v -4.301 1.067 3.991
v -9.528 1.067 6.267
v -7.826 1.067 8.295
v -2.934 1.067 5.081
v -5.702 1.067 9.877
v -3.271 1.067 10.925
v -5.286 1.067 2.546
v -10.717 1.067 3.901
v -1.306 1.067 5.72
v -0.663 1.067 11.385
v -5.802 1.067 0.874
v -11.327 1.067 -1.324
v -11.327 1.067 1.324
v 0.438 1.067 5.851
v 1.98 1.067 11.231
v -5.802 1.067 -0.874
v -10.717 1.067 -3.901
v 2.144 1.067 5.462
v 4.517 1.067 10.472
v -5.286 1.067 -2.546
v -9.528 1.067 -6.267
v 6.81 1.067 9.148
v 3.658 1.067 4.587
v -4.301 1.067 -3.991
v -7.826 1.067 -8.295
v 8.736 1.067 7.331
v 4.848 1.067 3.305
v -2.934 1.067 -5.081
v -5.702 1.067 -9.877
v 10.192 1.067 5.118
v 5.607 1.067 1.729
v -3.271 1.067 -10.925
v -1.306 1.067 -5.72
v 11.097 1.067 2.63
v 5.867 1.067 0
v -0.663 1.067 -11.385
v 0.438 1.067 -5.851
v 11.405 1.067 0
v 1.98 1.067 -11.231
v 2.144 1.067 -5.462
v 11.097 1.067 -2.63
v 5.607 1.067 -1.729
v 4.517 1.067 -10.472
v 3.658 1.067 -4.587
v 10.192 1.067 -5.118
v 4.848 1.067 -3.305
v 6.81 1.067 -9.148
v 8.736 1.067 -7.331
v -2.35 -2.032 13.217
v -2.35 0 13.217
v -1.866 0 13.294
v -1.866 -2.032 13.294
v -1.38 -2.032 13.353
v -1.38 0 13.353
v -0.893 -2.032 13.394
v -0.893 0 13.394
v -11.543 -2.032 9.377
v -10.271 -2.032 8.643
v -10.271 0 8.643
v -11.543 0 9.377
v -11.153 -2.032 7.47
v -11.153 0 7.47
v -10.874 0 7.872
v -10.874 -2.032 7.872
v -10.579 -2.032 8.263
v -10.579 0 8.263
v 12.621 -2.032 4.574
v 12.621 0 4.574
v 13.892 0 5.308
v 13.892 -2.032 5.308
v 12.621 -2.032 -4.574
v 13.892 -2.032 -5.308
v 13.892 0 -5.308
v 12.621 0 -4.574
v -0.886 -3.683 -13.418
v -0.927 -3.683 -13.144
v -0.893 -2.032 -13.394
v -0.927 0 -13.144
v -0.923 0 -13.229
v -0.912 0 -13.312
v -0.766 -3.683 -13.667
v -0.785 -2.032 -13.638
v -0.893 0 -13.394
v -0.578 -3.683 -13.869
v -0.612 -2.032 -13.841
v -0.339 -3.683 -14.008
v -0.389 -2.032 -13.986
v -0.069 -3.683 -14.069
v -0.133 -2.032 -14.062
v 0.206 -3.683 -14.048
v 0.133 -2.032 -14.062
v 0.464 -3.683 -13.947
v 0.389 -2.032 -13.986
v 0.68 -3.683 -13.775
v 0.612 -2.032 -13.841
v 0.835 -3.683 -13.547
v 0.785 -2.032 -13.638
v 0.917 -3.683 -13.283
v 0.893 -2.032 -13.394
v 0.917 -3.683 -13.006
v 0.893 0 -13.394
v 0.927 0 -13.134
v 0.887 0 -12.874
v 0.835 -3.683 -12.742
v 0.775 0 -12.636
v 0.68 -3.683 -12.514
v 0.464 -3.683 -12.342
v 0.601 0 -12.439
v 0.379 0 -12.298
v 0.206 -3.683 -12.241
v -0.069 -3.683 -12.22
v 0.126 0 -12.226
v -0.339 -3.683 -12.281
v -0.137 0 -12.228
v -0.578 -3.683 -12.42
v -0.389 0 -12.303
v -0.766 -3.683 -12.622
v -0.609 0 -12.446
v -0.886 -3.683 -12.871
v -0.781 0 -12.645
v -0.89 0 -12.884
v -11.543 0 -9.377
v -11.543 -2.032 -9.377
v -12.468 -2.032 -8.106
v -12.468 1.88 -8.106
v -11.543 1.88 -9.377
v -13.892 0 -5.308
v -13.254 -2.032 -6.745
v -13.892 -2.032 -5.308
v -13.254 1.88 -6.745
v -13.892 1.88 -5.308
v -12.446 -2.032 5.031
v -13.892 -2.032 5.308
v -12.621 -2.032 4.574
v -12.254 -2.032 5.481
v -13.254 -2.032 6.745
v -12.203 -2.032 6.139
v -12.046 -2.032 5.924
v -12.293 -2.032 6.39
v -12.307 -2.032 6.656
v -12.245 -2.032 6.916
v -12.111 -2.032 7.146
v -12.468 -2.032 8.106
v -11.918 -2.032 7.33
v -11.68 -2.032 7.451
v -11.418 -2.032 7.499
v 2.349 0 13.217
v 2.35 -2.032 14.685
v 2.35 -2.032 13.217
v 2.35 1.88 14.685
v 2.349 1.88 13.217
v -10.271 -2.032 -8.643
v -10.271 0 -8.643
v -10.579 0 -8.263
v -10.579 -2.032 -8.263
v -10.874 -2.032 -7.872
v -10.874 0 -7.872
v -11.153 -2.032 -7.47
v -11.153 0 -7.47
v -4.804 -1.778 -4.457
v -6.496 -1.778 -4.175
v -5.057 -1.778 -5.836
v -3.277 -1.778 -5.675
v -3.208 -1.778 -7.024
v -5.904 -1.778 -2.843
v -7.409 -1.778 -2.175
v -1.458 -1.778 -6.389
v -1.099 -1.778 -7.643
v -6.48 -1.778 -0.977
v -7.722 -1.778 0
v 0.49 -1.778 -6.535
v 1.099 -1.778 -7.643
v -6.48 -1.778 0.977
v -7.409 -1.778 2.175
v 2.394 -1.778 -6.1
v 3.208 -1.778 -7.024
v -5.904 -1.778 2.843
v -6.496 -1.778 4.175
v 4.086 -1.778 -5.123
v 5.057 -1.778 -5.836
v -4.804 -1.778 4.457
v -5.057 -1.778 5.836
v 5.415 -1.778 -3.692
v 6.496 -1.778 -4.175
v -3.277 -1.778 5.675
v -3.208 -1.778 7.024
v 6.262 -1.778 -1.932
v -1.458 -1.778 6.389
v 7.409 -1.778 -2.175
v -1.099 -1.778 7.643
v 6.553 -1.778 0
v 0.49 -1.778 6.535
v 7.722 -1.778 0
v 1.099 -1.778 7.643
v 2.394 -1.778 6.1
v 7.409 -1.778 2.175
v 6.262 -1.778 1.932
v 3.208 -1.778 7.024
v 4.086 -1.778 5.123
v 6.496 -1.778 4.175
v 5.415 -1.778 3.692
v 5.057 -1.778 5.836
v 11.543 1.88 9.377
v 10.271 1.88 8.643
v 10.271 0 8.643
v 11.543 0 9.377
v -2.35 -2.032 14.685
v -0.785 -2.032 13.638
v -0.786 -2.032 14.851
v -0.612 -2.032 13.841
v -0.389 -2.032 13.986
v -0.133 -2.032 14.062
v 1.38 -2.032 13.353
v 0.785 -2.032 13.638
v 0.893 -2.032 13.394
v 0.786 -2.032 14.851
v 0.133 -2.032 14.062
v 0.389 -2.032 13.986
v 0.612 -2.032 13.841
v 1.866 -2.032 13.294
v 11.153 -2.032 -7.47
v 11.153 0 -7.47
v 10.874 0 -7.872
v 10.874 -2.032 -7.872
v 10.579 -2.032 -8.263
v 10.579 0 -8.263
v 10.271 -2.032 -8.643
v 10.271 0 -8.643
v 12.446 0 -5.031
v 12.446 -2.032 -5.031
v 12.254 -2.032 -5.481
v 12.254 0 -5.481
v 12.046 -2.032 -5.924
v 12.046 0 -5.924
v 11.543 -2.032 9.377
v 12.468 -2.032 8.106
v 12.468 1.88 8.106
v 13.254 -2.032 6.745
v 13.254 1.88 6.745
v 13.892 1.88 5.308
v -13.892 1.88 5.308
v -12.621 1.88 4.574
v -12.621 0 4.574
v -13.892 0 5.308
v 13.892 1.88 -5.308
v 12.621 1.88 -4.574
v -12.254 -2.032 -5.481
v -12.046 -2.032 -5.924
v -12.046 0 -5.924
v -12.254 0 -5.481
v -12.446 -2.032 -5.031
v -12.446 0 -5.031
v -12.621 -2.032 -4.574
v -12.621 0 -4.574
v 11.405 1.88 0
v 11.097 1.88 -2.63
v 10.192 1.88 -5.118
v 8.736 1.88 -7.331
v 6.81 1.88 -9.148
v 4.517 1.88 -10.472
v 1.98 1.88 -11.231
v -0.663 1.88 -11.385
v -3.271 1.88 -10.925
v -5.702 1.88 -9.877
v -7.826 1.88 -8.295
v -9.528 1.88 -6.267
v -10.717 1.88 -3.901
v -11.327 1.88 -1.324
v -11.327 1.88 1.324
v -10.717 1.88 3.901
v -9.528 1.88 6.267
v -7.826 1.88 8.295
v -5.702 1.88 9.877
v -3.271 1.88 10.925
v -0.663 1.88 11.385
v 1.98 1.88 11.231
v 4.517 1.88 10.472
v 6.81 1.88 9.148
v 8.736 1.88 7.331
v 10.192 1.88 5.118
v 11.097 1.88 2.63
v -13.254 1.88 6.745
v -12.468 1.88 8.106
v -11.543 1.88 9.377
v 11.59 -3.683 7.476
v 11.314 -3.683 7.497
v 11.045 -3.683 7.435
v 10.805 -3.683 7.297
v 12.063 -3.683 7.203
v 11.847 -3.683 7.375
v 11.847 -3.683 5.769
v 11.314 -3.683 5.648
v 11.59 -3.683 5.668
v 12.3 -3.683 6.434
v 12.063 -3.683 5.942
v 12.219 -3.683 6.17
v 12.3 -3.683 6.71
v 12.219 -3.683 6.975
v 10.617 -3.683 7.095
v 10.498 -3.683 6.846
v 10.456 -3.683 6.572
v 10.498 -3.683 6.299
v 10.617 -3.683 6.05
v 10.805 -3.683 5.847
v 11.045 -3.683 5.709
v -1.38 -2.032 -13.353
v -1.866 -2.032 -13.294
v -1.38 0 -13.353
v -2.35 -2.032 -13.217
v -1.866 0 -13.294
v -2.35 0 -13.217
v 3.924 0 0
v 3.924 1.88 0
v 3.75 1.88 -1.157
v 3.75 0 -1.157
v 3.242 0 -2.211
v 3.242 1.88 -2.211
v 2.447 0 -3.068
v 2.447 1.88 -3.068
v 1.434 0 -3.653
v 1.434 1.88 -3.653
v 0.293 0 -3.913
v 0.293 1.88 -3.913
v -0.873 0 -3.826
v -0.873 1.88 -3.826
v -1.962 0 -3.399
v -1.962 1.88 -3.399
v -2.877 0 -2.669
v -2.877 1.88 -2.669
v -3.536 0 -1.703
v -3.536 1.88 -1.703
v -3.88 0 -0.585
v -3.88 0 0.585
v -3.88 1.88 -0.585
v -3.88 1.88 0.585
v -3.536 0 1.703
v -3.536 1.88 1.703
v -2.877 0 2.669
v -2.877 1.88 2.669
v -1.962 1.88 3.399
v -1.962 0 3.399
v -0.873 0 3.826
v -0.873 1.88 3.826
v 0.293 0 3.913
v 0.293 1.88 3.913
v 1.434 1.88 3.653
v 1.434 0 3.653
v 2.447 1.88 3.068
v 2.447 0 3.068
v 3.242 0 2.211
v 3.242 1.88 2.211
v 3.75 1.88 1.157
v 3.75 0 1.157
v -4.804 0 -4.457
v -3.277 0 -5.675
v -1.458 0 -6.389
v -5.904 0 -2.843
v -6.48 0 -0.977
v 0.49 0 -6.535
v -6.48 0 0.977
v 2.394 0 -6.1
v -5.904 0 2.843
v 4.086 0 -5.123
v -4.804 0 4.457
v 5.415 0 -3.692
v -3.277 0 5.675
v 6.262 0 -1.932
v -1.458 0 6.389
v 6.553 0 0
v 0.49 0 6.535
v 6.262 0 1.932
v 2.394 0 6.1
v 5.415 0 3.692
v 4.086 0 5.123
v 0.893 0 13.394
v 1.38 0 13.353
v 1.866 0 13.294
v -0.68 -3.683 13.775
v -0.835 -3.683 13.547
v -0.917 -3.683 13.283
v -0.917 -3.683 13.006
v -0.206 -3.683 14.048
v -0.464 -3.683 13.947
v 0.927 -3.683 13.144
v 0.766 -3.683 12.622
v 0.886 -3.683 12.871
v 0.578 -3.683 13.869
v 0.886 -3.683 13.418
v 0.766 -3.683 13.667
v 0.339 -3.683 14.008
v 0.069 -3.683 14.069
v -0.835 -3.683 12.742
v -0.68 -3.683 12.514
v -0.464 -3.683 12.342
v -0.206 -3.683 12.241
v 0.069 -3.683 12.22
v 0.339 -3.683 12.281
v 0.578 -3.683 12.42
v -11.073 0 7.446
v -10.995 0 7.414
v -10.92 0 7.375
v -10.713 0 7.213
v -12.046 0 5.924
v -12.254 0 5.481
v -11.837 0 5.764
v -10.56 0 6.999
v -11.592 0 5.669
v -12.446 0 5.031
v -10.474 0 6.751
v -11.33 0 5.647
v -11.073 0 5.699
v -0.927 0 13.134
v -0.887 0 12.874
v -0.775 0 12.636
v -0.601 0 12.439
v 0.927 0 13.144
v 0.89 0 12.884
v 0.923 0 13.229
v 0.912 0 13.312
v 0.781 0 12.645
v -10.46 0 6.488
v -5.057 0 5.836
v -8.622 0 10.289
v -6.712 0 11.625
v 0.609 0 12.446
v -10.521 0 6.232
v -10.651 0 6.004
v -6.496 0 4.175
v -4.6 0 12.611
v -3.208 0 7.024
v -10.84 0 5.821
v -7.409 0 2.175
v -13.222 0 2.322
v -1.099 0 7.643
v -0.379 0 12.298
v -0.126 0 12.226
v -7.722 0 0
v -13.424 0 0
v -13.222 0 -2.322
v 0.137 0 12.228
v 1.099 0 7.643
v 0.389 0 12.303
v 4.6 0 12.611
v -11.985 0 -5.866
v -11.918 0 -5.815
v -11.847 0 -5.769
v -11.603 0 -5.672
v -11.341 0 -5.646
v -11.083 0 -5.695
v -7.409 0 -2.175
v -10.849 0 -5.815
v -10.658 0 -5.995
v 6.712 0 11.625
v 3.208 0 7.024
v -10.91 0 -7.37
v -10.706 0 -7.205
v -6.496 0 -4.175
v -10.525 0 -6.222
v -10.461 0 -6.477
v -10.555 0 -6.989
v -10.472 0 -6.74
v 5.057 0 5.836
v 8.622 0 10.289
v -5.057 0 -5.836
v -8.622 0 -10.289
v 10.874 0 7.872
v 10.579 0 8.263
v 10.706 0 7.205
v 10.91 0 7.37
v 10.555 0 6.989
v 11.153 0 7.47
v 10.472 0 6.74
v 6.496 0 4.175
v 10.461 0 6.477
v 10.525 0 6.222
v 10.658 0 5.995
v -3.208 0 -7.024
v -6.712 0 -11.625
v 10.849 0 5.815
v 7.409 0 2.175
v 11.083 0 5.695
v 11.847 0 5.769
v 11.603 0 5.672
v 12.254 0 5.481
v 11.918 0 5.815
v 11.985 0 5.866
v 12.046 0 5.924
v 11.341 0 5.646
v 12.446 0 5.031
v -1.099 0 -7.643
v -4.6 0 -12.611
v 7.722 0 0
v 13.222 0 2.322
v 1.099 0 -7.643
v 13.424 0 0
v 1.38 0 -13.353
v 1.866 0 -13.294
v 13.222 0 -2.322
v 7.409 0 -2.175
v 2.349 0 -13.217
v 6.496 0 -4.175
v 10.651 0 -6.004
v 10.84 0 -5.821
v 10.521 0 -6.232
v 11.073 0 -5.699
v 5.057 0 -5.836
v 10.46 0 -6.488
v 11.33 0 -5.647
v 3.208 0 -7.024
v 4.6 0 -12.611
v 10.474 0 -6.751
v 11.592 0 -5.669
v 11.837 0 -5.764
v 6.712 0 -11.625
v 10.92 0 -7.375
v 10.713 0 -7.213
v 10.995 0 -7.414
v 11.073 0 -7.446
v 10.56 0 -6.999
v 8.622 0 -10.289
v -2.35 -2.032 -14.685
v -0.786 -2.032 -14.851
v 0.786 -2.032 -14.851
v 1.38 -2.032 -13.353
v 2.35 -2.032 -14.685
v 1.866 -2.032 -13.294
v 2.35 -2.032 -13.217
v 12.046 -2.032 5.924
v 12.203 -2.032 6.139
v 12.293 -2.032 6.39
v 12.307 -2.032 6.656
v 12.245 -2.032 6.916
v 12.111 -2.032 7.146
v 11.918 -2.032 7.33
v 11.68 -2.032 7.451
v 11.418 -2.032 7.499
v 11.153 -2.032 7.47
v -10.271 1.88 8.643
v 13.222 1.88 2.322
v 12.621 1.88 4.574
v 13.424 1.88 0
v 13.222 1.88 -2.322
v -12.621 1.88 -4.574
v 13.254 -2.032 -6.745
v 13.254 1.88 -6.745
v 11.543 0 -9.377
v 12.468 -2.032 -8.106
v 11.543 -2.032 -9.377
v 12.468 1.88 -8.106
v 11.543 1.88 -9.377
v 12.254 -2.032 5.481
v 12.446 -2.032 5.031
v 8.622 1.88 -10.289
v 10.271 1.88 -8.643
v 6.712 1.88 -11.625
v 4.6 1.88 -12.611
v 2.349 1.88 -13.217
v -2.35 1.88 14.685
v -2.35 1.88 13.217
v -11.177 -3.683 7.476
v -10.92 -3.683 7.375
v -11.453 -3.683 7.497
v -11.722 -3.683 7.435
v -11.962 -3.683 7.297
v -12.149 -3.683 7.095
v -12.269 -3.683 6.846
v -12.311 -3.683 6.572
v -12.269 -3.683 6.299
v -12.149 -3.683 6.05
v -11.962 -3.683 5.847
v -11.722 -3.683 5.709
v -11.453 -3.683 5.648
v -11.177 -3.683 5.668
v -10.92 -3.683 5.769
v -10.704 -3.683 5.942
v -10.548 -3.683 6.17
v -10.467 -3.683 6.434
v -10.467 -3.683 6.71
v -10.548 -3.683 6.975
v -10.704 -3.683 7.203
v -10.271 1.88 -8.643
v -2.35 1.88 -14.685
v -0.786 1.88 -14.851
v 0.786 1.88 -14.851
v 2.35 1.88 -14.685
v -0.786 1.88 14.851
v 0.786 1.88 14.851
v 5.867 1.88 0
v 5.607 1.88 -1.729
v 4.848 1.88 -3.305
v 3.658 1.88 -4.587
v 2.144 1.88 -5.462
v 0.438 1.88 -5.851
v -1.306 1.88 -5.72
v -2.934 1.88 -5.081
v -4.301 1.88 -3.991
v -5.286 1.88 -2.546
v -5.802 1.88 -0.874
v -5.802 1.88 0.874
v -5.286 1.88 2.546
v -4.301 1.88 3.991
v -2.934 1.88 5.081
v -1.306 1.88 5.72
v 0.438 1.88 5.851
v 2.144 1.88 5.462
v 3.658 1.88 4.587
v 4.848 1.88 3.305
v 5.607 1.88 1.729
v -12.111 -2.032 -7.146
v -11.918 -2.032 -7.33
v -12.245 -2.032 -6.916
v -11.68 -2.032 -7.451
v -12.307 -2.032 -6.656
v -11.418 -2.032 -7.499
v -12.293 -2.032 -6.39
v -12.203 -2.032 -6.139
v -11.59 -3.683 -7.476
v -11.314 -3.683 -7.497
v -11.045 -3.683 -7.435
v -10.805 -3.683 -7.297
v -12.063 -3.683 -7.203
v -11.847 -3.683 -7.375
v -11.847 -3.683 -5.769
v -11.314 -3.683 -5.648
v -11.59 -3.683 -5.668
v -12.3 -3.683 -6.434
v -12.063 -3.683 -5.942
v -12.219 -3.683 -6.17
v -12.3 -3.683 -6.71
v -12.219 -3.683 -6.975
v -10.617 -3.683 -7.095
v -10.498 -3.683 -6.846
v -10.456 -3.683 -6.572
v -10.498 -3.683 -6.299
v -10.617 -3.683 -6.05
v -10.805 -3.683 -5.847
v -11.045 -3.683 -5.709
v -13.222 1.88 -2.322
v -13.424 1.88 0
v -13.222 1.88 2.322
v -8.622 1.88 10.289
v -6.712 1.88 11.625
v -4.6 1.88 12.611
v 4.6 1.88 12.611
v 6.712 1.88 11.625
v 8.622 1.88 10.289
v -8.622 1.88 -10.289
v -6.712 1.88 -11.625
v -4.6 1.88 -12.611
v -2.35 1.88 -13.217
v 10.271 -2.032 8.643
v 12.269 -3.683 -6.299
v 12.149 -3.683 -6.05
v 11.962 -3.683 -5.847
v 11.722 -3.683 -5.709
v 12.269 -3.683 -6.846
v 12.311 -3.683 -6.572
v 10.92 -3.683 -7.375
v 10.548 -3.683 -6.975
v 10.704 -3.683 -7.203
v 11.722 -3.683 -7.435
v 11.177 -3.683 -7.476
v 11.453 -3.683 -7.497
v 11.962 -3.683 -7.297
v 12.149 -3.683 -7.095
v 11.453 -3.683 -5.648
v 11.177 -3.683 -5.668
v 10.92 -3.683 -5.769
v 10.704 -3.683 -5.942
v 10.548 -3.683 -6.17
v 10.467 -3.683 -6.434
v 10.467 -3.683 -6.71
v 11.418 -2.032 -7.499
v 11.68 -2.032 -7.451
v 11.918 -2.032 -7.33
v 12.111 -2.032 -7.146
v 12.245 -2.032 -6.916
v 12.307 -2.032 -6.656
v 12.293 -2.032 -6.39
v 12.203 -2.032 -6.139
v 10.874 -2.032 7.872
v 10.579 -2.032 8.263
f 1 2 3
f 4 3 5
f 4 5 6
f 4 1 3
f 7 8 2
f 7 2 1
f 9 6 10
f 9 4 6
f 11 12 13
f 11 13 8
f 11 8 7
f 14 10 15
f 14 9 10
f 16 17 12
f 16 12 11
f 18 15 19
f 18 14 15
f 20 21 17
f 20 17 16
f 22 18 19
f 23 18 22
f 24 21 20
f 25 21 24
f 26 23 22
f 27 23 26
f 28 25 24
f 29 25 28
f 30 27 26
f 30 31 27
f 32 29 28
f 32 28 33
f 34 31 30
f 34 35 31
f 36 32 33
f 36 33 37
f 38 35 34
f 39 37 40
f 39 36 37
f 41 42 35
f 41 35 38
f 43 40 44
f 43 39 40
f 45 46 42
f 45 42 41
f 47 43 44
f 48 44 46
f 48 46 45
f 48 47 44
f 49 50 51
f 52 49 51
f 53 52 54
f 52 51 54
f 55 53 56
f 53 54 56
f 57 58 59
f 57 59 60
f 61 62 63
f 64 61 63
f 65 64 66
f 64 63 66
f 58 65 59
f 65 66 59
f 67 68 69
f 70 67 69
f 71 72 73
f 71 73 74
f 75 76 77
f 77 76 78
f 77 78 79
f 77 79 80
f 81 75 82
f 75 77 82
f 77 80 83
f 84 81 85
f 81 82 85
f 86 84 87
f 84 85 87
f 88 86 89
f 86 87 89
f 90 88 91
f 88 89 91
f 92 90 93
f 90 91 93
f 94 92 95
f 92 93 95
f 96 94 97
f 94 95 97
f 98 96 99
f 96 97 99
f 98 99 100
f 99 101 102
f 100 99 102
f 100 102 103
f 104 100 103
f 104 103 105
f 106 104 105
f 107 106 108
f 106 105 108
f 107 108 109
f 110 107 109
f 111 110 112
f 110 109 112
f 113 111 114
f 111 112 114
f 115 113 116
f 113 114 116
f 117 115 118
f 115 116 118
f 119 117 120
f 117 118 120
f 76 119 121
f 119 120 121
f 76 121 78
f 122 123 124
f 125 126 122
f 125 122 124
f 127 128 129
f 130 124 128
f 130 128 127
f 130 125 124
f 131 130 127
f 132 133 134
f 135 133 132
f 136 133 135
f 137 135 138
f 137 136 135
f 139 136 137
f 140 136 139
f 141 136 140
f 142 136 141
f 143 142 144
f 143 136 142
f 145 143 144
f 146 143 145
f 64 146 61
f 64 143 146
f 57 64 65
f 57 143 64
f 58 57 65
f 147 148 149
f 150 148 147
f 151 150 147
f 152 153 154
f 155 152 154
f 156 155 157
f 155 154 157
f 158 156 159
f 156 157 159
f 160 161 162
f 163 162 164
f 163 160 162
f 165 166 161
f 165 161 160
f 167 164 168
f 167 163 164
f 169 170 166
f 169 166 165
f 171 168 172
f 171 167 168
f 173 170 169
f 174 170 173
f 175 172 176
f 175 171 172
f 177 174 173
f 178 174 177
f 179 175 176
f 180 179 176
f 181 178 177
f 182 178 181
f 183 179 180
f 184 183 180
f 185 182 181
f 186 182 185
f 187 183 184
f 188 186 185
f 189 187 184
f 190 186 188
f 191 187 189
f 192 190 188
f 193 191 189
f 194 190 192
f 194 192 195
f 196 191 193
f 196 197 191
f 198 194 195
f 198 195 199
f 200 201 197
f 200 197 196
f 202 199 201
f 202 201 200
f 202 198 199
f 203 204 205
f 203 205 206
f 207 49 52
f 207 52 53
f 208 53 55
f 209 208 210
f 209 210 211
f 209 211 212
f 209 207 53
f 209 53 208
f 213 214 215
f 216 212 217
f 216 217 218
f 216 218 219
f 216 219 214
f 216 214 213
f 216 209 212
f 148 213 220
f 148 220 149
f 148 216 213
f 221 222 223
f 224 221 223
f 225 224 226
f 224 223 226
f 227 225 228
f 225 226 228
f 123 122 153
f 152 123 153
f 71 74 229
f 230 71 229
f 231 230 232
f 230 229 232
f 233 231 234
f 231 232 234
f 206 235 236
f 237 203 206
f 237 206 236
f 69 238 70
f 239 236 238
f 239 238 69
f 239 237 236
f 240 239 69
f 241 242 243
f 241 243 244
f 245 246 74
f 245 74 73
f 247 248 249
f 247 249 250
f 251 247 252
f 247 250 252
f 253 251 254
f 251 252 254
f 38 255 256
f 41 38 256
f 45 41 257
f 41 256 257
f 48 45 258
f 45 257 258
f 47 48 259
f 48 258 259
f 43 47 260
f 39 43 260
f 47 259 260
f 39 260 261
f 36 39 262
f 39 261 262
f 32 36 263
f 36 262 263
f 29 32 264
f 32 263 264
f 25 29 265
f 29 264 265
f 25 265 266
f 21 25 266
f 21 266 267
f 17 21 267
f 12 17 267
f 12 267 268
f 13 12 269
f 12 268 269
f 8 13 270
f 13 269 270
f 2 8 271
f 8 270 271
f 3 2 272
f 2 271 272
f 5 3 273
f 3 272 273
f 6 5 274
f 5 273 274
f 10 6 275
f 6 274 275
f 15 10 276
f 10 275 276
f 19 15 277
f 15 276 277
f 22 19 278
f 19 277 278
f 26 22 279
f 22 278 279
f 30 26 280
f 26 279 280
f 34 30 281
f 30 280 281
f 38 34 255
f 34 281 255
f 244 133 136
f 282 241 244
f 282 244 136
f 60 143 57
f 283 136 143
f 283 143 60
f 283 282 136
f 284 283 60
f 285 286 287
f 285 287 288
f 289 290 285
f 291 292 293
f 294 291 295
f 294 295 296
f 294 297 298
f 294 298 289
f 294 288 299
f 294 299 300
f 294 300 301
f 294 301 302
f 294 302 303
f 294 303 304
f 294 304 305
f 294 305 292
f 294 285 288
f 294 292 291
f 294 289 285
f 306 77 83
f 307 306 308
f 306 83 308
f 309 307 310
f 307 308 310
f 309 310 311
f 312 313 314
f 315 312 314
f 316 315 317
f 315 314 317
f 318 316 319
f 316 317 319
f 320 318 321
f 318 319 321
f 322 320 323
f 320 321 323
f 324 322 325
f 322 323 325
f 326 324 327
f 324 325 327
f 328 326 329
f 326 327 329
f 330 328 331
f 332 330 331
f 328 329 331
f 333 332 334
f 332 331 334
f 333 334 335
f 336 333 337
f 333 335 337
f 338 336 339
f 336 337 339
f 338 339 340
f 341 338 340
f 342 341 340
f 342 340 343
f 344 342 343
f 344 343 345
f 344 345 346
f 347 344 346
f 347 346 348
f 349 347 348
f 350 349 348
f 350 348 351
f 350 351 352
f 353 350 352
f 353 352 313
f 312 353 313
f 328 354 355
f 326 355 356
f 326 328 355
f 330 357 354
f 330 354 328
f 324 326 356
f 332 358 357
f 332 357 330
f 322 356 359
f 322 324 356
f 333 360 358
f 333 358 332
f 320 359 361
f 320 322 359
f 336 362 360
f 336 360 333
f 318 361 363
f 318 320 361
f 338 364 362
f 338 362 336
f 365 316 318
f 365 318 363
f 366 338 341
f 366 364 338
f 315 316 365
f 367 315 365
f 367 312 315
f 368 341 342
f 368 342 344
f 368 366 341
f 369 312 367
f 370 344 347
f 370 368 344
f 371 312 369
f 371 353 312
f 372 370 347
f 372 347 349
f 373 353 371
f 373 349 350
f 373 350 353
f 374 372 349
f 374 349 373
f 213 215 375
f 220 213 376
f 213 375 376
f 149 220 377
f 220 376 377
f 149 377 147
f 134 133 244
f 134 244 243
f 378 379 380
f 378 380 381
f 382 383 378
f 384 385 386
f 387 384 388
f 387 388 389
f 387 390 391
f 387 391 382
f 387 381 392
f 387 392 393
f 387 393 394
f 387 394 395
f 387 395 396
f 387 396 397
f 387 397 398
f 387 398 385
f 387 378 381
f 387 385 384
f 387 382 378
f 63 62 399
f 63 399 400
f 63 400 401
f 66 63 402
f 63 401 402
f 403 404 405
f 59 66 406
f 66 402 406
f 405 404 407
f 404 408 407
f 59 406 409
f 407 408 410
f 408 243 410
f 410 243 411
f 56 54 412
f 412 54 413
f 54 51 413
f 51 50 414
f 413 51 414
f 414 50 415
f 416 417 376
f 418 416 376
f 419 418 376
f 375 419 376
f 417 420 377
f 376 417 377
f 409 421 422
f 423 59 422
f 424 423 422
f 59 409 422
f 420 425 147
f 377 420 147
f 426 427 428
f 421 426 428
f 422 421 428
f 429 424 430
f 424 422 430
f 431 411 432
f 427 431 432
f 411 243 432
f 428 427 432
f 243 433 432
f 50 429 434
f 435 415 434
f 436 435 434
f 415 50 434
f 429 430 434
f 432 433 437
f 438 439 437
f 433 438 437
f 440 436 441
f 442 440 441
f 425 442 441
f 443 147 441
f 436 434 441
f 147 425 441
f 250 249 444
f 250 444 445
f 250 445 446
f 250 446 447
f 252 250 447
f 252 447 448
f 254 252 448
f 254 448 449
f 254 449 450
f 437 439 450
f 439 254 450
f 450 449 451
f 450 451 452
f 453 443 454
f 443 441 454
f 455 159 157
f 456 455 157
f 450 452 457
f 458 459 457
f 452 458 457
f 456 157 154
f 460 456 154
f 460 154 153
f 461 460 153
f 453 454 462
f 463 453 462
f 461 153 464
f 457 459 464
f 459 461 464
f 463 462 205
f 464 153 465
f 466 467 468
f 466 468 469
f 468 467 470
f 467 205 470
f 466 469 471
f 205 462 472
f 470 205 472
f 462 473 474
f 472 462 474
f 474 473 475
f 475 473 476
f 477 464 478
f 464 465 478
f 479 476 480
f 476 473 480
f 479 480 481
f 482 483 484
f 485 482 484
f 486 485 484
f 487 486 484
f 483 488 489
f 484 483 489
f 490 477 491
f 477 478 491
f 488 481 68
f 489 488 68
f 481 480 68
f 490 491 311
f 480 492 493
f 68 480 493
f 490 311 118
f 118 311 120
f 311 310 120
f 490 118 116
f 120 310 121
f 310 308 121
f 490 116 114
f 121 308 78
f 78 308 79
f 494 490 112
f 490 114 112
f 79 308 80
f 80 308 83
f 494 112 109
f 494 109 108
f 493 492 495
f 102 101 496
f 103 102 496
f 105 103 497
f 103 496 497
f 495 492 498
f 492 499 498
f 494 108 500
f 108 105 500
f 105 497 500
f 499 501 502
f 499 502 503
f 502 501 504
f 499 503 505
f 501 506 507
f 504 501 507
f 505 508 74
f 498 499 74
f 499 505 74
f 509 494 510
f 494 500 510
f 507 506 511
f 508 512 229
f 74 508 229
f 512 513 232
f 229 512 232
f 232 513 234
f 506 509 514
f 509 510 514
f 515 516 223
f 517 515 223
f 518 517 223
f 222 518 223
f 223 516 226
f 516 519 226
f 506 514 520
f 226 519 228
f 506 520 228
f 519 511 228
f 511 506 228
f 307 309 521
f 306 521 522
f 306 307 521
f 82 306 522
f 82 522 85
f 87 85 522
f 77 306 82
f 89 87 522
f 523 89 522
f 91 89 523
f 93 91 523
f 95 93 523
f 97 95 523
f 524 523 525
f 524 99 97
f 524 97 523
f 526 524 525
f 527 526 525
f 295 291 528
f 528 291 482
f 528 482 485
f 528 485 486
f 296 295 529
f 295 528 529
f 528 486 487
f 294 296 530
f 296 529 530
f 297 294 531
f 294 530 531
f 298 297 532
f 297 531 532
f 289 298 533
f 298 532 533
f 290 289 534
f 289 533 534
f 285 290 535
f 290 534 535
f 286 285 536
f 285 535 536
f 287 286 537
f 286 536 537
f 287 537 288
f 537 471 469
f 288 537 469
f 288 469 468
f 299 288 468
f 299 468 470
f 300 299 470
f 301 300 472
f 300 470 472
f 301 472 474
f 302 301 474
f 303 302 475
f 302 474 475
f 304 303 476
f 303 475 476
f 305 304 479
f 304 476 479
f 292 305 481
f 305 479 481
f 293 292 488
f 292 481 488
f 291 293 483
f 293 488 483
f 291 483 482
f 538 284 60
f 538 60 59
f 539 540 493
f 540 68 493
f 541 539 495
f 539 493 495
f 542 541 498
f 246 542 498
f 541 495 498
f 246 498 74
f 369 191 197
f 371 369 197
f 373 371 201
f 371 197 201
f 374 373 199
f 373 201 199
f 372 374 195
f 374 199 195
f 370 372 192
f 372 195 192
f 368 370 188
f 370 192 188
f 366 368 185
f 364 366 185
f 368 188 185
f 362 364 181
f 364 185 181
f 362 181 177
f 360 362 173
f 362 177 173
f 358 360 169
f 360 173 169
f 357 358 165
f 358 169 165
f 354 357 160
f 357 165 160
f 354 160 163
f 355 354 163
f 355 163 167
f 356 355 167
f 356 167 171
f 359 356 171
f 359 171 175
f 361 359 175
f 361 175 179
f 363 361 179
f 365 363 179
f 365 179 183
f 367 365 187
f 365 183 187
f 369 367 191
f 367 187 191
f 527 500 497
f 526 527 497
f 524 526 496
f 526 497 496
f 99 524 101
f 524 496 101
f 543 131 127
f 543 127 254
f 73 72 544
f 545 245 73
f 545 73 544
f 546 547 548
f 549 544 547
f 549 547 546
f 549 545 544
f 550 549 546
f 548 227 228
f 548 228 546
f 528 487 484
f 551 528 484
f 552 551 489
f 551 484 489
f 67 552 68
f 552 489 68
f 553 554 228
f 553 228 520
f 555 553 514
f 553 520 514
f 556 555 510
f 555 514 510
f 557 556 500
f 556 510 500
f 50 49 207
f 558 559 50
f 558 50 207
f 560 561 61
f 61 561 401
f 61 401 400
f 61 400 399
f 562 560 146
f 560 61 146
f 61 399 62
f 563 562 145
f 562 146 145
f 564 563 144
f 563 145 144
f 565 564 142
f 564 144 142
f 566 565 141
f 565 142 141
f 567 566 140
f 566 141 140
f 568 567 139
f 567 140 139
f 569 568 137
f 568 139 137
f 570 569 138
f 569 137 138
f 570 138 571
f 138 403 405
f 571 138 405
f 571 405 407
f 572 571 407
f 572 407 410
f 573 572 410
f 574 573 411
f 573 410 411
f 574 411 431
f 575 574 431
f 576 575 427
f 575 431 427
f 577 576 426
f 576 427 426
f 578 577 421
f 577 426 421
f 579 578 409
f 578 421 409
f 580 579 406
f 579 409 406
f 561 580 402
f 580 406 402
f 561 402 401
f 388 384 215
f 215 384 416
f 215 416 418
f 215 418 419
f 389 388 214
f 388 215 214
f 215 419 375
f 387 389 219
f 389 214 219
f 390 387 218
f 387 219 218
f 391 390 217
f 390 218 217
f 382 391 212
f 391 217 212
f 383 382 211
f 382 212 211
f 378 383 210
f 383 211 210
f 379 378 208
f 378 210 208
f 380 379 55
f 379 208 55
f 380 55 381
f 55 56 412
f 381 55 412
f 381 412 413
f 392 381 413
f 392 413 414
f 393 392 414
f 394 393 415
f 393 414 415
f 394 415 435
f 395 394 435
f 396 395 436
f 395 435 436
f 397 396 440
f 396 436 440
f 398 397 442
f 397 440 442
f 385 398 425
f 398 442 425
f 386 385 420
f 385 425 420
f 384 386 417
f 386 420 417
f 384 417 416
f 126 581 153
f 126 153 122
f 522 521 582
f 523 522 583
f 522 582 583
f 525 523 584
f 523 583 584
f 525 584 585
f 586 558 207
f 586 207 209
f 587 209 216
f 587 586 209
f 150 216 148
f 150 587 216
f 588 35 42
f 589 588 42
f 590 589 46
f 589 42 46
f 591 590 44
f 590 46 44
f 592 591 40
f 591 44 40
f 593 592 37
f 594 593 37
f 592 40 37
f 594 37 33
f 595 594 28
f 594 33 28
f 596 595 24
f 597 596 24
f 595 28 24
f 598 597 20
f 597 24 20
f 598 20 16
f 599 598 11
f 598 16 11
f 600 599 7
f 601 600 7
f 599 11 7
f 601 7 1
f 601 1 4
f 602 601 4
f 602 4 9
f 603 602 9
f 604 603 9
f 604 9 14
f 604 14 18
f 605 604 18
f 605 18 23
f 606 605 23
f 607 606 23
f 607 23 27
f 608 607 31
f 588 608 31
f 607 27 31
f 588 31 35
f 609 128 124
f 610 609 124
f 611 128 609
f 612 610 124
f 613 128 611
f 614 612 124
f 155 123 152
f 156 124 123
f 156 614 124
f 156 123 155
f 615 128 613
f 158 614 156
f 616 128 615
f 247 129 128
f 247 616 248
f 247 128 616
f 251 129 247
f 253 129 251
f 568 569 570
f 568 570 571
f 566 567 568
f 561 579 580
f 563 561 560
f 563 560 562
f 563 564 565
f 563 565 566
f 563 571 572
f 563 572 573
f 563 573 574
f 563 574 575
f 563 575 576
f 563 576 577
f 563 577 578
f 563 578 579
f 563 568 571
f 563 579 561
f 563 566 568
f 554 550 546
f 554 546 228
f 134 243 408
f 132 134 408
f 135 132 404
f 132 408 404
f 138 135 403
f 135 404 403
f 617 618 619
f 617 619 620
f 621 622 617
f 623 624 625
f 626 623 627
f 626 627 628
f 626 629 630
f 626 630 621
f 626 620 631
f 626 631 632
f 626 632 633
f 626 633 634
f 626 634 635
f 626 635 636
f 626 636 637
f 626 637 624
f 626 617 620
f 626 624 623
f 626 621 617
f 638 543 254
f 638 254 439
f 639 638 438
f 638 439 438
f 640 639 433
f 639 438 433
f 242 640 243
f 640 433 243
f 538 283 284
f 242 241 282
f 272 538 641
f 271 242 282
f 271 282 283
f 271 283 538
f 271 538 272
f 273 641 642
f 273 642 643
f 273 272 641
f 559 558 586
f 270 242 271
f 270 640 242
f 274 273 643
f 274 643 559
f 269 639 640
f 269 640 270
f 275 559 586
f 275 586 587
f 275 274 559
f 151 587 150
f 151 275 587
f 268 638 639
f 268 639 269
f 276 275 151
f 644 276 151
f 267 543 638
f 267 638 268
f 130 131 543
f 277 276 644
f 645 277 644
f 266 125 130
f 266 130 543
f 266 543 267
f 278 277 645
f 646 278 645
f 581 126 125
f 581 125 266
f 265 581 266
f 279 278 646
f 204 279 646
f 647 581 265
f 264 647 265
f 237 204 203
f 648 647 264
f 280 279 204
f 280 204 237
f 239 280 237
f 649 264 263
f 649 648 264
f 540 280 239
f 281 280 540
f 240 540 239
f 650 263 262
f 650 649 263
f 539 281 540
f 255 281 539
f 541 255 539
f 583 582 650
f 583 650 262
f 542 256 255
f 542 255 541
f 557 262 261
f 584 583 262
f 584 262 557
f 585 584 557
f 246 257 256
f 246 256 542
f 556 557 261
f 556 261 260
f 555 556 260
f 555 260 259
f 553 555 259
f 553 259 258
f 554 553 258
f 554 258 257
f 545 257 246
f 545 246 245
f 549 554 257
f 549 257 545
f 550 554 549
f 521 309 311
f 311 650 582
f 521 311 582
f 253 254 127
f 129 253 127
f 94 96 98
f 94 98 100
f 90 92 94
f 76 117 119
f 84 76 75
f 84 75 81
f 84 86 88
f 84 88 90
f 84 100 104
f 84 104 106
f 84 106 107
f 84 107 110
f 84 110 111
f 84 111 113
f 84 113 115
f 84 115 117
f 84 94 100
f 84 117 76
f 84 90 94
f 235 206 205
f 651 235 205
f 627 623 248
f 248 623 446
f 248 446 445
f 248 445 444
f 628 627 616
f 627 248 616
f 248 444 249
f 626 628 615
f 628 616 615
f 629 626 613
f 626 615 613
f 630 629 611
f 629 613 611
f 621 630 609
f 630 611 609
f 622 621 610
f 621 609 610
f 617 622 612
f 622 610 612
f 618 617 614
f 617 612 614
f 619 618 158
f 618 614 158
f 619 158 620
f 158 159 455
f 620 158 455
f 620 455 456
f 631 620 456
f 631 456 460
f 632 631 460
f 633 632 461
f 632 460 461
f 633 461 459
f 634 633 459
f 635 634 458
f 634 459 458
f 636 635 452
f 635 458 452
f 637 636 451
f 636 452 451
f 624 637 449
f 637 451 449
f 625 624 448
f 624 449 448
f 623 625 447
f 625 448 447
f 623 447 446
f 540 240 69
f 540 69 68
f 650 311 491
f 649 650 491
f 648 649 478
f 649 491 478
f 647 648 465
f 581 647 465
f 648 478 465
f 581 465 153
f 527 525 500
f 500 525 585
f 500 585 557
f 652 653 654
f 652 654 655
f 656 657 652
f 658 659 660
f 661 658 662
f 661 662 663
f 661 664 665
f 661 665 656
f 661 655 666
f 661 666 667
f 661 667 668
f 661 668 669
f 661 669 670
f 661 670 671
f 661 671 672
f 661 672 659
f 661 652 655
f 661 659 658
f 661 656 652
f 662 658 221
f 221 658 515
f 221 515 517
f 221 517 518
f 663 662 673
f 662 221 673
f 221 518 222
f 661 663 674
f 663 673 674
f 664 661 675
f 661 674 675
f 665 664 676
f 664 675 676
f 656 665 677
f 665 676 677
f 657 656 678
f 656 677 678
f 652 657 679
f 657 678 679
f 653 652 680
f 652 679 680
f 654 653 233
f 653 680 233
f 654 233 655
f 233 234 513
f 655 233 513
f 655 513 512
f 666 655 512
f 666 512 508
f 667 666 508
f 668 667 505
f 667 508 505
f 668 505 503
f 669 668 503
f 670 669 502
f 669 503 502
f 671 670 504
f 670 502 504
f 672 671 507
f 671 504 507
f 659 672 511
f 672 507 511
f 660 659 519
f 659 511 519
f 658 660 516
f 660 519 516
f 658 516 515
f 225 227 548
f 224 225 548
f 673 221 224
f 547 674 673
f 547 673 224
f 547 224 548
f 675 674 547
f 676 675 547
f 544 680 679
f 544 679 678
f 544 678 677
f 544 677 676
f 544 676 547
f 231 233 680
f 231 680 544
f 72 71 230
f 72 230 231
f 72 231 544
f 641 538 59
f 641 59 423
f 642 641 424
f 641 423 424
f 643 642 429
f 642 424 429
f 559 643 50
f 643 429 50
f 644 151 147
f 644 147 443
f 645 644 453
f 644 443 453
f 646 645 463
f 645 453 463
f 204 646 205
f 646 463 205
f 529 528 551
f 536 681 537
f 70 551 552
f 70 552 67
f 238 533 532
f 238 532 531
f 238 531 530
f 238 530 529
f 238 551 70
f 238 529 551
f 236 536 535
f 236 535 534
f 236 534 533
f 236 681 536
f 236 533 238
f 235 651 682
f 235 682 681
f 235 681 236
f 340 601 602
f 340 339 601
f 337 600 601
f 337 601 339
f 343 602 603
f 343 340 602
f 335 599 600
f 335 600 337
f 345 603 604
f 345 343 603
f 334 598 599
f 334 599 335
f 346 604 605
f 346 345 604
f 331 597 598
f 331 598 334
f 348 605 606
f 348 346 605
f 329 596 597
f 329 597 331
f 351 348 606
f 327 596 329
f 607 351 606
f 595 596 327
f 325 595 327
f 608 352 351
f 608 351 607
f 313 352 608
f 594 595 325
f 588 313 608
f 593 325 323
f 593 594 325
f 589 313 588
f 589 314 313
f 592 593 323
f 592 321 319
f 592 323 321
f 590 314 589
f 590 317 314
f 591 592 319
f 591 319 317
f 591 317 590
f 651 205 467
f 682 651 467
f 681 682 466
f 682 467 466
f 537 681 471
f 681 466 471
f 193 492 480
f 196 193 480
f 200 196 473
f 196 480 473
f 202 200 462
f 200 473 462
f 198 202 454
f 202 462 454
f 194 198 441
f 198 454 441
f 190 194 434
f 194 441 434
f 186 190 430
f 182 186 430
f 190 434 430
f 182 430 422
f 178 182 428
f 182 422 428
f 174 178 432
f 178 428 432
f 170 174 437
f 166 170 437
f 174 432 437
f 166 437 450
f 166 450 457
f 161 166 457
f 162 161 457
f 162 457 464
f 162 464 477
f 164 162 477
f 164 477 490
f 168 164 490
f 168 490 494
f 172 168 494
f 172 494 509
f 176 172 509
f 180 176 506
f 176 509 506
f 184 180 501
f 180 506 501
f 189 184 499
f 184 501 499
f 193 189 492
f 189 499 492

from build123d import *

# Parameters (mm, degrees)
SKETCH1_R           = 13.4239
BOSS_EXTRUDE1_DEPTH = 1.8796
BOSS_EXTRUDE2_DEPTH = 1.8796
SKETCH3_R           = 11.4046
CUT_EXTRUDE1_DEPTH  = 0.8128
SKETCH4_R           = 5.8674
BOSS_EXTRUDE3_DEPTH = 0.8128
SKETCH5_R           = 3.9243
CUT_EXTRUDE2_DEPTH  = 2.8796
SKETCH6_R           = 7.7216
BOSS_EXTRUDE4_DEPTH = 1.778
SKETCH7_R           = 6.5532
CUT_EXTRUDE3_DEPTH  = 1.778
BOSS_EXTRUDE5_DEPTH = 2.032
SKETCH9_R           = 0.9271
BOSS_EXTRUDE6_DEPTH = 3.683
CIRPATTERN1_COUNT   = 6


with BuildPart() as part:
    # Sketch1 → Boss-Extrude1 (new body)
    with BuildSketch(Plane(origin=(0, 0, 0), x_dir=(1, 0, 0), z_dir=(0, 1, 0))):
        Circle(SKETCH1_R)
    extrude(amount=BOSS_EXTRUDE1_DEPTH)

    # Sketch2 → Boss-Extrude2 (add)
    with BuildSketch(Plane(origin=(0, 1.8796, 0), x_dir=(1, 0, 0), z_dir=(0, 1, 0))):
        with BuildLine():
            Line((-13.892276606, 5.307740723), (-4.699, 0))
            Line((-4.699, 0), (-13.892276606, -5.307740723))
            ThreePointArc((-13.892276606, -5.307740723), (-12.879269997, -7.43585), (-11.542776606, -9.377194096))
            Line((-11.542776606, -9.377194096), (-2.3495, -4.069453372))
            Line((-2.3495, -4.069453372), (-2.3495, -14.684934819))
            ThreePointArc((-2.3495, -14.684934819), (0, -14.8717), (2.3495, -14.684934819))
            Line((2.3495, -14.684934819), (2.3495, -4.069453372))
            Line((2.3495, -4.069453372), (11.542776606, -9.377194096))
            ThreePointArc((11.542776606, -9.377194096), (12.879269997, -7.43585), (13.892276606, -5.307740723))
            Line((13.892276606, -5.307740723), (4.699, 0))
            Line((4.699, 0), (13.892276606, 5.307740723))
            ThreePointArc((13.892276606, 5.307740723), (12.879269997, 7.43585), (11.542776606, 9.377194096))
            Line((11.542776606, 9.377194096), (2.3495, 4.069453372))
            Line((2.3495, 4.069453372), (2.3495, 14.684934819))
            ThreePointArc((2.3495, 14.684934819), (0, 14.8717), (-2.3495, 14.684934819))
            Line((-2.3495, 14.684934819), (-2.3495, 4.069453372))
            Line((-2.3495, 4.069453372), (-11.542776606, 9.377194096))
            ThreePointArc((-11.542776606, 9.377194096), (-12.879269997, 7.43585), (-13.892276606, 5.307740723))
        make_face()
    extrude(amount=-BOSS_EXTRUDE2_DEPTH)

    # Sketch3 → Cut-Extrude1 (cut)
    with BuildSketch(Plane(origin=(0, 1.8796, 0), x_dir=(1, 0, 0), z_dir=(0, 1, 0))):
        Circle(SKETCH3_R)
    extrude(amount=-CUT_EXTRUDE1_DEPTH, mode=Mode.SUBTRACT)

    # Sketch4 → Boss-Extrude3 (add)
    with BuildSketch(Plane(origin=(0, 1.0668, 0), x_dir=(1, 0, 0), z_dir=(0, 1, 0))):
        Circle(SKETCH4_R)
    extrude(amount=BOSS_EXTRUDE3_DEPTH)

    # Sketch5 → Cut-Extrude2 (cut, through all)
    with BuildSketch(Plane(origin=(0, 1.8796, 0), x_dir=(1, 0, 0), z_dir=(0, 1, 0))):
        Circle(SKETCH5_R)
    extrude(amount=-CUT_EXTRUDE2_DEPTH, mode=Mode.SUBTRACT)

    # Sketch6 → Boss-Extrude4 (add)
    with BuildSketch(Plane.XZ):
        Circle(SKETCH6_R)
    extrude(amount=BOSS_EXTRUDE4_DEPTH)

    # Sketch7 → Cut-Extrude3 (cut)
    with BuildSketch(Plane.XZ.offset(1.778)):
        Circle(SKETCH7_R)
    extrude(amount=-CUT_EXTRUDE3_DEPTH, mode=Mode.SUBTRACT)

    # Sketch8 → Boss-Extrude5 (add)
    with BuildSketch(Plane.XZ):
        with BuildLine():
            Line((-2.3495, -13.216691756), (-2.3495, -14.684934819))
            ThreePointArc((-2.3495, -14.684934819), (0, -14.8717), (2.3495, -14.684934819))
            Line((2.3495, -14.684934819), (2.3495, -13.216691756))
            ThreePointArc((2.3495, -13.216691756), (0, -13.4239), (-2.3495, -13.216691756))
        make_face()
        with BuildLine():
            Line((10.271240814, -8.643072564), (11.542776606, -9.377194096))
            ThreePointArc((11.542776606, -9.377194096), (12.879269997, -7.43585), (13.892276606, -5.307740723))
            Line((13.892276606, -5.307740723), (12.620740814, -4.573619192))
            ThreePointArc((12.620740814, -4.573619192), (11.625438418, -6.71195), (10.271240814, -8.643072564))
        make_face()
        with BuildLine():
            Line((12.620740814, 4.573619192), (13.892276606, 5.307740723))
            ThreePointArc((13.892276606, 5.307740723), (12.879269997, 7.43585), (11.542776606, 9.377194096))
            Line((11.542776606, 9.377194096), (10.271240814, 8.643072564))
            ThreePointArc((10.271240814, 8.643072564), (11.625438418, 6.71195), (12.620740814, 4.573619192))
        make_face()
        with BuildLine():
            Line((2.3495, 13.216691756), (2.3495, 14.684934819))
            ThreePointArc((2.3495, 14.684934819), (0, 14.8717), (-2.3495, 14.684934819))
            Line((-2.3495, 14.684934819), (-2.3495, 13.216691756))
            ThreePointArc((-2.3495, 13.216691756), (0, 13.4239), (2.3495, 13.216691756))
        make_face()
        with BuildLine():
            Line((-10.271240814, 8.643072564), (-11.542776606, 9.377194096))
            ThreePointArc((-11.542776606, 9.377194096), (-12.879269997, 7.43585), (-13.892276606, 5.307740723))
            Line((-13.892276606, 5.307740723), (-12.620740814, 4.573619192))
            ThreePointArc((-12.620740814, 4.573619192), (-11.625438418, 6.71195), (-10.271240814, 8.643072564))
        make_face()
        with BuildLine():
            Line((-12.620740814, -4.573619192), (-13.892276606, -5.307740723))
            ThreePointArc((-13.892276606, -5.307740723), (-12.879269997, -7.43585), (-11.542776606, -9.377194096))
            Line((-11.542776606, -9.377194096), (-10.271240814, -8.643072564))
            ThreePointArc((-10.271240814, -8.643072564), (-11.625438418, -6.71195), (-12.620740814, -4.573619192))
        make_face()
    extrude(amount=BOSS_EXTRUDE5_DEPTH)

    # Sketch9 → Boss-Extrude6 (add)
    with BuildSketch(Plane.XZ):
        with Locations((0, 13.1445)):
            Circle(SKETCH9_R)
    boss_extrude6 = extrude(amount=BOSS_EXTRUDE6_DEPTH)

    # CirPattern1: Boss-Extrude6 ×6 about axis
    cirpattern1_axis = Axis((0, 0, 0), (0, 1, 0))
    for i in range(1, CIRPATTERN1_COUNT):
        add(boss_extrude6.rotate(cirpattern1_axis, i * 360 / CIRPATTERN1_COUNT))


solid = part.part
